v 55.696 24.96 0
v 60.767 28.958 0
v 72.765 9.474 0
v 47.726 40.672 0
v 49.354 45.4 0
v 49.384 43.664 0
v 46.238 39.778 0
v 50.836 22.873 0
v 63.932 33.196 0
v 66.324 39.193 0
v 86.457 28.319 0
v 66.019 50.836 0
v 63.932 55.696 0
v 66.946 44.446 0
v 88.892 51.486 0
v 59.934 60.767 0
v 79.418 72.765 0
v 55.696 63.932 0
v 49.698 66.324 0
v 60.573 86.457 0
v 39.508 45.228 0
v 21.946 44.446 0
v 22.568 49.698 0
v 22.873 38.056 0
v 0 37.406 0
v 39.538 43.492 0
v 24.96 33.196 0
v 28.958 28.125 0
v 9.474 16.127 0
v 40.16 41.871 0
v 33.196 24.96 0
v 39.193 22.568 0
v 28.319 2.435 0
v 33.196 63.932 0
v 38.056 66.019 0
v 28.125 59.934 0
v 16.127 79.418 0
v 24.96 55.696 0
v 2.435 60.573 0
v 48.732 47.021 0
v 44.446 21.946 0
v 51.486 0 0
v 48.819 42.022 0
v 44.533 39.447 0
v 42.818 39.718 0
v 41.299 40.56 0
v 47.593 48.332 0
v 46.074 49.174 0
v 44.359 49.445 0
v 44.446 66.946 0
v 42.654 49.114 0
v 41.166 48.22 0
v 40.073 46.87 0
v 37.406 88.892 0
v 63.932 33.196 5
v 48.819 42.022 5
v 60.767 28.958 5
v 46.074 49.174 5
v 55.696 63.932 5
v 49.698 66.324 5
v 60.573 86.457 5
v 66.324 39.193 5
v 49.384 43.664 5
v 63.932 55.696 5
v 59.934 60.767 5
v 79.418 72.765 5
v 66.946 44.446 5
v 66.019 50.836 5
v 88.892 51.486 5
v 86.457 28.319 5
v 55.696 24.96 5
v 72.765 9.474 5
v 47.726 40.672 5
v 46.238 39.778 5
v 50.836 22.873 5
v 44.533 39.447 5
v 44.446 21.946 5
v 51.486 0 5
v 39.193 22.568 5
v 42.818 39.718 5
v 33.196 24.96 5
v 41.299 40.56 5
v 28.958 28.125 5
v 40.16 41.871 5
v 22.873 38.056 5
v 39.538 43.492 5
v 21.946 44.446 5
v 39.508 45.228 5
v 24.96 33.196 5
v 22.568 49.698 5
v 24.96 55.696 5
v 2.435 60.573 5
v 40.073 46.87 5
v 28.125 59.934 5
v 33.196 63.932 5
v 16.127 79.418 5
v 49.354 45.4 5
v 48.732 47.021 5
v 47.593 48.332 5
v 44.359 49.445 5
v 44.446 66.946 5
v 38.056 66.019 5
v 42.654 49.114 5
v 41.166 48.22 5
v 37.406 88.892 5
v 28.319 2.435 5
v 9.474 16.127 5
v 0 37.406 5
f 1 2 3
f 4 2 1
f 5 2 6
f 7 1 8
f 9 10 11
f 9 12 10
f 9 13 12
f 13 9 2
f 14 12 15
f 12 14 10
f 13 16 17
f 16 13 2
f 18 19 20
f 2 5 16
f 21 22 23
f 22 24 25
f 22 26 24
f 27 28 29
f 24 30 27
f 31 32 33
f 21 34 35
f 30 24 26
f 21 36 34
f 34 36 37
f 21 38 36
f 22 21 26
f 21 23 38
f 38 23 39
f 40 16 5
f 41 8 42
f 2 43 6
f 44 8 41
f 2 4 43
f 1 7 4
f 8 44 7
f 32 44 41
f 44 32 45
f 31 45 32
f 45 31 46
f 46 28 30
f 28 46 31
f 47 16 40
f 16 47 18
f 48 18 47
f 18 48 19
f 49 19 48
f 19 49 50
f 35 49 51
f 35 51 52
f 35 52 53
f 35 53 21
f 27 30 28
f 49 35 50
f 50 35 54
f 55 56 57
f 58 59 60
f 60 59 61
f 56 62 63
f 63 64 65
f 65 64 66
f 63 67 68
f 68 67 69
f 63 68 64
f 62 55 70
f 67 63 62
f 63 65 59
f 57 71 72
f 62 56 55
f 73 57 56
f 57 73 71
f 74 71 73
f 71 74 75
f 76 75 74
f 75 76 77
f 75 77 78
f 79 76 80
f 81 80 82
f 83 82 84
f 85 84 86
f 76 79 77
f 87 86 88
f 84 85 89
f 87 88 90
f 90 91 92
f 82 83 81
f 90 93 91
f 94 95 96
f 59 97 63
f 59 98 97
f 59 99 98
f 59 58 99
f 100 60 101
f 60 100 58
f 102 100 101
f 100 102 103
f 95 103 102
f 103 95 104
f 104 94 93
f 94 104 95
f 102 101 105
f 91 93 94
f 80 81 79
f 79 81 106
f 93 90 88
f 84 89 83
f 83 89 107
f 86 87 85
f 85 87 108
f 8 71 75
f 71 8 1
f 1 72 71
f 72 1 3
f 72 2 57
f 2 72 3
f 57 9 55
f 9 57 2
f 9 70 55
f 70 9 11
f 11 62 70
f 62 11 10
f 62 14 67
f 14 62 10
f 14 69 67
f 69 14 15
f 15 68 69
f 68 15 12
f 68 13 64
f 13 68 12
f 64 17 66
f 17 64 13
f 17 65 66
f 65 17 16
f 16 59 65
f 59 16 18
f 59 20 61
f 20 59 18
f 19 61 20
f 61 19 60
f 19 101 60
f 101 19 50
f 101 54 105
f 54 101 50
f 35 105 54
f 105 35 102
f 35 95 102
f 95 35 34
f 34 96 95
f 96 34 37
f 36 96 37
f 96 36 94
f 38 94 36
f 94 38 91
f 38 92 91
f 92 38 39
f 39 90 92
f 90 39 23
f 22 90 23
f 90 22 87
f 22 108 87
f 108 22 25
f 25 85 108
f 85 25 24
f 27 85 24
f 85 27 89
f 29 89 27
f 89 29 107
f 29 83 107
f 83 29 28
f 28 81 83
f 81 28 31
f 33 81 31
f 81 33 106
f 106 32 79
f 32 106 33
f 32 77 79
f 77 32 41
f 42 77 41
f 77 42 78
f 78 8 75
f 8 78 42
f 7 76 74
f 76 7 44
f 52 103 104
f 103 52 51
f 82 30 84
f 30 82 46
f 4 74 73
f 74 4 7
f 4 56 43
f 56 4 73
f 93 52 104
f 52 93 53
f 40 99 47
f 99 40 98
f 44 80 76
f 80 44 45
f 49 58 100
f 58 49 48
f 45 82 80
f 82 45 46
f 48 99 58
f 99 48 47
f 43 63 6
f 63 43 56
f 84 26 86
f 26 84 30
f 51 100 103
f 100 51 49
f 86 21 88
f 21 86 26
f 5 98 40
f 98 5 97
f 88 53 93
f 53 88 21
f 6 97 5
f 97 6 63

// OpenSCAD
$fn = 32;

// ----------------------------------------------------------------------
// Star wheel: 12-point ratchet, R45
// ----------------------------------------------------------------------

// --- parameters (mm) ---
n_points = 12;            // number of points / teeth
r_out = 45;               // tip radius
r_in = 22.5;              // root radius
bore_r = 5;               // centre bore radius
plate_t = 5;              // plate thickness, Z (extrusion height)
bore_d = 10;              // centre bore diameter

profile = [[21.946, 44.446], [0, 37.406], [22.873, 38.056], [24.96, 33.196], [9.474, 16.127], [28.958, 28.125], [33.196, 24.96], [28.319, 2.435], [39.193, 22.568], [44.446, 21.946], [51.486, 0], [50.836, 22.873], [55.696, 24.96], [72.765, 9.474], [60.767, 28.958], [63.932, 33.196], [86.457, 28.319], [66.324, 39.193], [66.946, 44.446], [88.892, 51.486], [66.019, 50.836], [63.932, 55.696], [79.418, 72.765], [59.934, 60.767], [55.696, 63.932], [60.573, 86.457], [49.698, 66.324], [44.446, 66.946], [37.406, 88.892], [38.056, 66.019], [33.196, 63.932], [16.127, 79.418], [28.125, 59.934], [24.96, 55.696], [2.435, 60.573], [22.568, 49.698]];  // primary outline, 36 points, counter clockwise
void_1 = [[49.354, 45.4], [48.732, 47.021], [47.593, 48.332], [46.074, 49.174], [44.359, 49.445], [42.654, 49.114], [41.166, 48.22], [40.073, 46.87], [39.508, 45.228], [39.538, 43.492], [40.16, 41.871], [41.299, 40.56], [42.818, 39.718], [44.533, 39.447], [46.238, 39.778], [47.726, 40.672], [48.819, 42.022], [49.384, 43.664]];  // centre bore, 18 points

// --- the one profile operation ---
difference() {
  linear_extrude(height = plate_t) polygon(points = profile);
  translate([0, 0, -1])
    linear_extrude(height = plate_t + 2) polygon(points = void_1);
}
